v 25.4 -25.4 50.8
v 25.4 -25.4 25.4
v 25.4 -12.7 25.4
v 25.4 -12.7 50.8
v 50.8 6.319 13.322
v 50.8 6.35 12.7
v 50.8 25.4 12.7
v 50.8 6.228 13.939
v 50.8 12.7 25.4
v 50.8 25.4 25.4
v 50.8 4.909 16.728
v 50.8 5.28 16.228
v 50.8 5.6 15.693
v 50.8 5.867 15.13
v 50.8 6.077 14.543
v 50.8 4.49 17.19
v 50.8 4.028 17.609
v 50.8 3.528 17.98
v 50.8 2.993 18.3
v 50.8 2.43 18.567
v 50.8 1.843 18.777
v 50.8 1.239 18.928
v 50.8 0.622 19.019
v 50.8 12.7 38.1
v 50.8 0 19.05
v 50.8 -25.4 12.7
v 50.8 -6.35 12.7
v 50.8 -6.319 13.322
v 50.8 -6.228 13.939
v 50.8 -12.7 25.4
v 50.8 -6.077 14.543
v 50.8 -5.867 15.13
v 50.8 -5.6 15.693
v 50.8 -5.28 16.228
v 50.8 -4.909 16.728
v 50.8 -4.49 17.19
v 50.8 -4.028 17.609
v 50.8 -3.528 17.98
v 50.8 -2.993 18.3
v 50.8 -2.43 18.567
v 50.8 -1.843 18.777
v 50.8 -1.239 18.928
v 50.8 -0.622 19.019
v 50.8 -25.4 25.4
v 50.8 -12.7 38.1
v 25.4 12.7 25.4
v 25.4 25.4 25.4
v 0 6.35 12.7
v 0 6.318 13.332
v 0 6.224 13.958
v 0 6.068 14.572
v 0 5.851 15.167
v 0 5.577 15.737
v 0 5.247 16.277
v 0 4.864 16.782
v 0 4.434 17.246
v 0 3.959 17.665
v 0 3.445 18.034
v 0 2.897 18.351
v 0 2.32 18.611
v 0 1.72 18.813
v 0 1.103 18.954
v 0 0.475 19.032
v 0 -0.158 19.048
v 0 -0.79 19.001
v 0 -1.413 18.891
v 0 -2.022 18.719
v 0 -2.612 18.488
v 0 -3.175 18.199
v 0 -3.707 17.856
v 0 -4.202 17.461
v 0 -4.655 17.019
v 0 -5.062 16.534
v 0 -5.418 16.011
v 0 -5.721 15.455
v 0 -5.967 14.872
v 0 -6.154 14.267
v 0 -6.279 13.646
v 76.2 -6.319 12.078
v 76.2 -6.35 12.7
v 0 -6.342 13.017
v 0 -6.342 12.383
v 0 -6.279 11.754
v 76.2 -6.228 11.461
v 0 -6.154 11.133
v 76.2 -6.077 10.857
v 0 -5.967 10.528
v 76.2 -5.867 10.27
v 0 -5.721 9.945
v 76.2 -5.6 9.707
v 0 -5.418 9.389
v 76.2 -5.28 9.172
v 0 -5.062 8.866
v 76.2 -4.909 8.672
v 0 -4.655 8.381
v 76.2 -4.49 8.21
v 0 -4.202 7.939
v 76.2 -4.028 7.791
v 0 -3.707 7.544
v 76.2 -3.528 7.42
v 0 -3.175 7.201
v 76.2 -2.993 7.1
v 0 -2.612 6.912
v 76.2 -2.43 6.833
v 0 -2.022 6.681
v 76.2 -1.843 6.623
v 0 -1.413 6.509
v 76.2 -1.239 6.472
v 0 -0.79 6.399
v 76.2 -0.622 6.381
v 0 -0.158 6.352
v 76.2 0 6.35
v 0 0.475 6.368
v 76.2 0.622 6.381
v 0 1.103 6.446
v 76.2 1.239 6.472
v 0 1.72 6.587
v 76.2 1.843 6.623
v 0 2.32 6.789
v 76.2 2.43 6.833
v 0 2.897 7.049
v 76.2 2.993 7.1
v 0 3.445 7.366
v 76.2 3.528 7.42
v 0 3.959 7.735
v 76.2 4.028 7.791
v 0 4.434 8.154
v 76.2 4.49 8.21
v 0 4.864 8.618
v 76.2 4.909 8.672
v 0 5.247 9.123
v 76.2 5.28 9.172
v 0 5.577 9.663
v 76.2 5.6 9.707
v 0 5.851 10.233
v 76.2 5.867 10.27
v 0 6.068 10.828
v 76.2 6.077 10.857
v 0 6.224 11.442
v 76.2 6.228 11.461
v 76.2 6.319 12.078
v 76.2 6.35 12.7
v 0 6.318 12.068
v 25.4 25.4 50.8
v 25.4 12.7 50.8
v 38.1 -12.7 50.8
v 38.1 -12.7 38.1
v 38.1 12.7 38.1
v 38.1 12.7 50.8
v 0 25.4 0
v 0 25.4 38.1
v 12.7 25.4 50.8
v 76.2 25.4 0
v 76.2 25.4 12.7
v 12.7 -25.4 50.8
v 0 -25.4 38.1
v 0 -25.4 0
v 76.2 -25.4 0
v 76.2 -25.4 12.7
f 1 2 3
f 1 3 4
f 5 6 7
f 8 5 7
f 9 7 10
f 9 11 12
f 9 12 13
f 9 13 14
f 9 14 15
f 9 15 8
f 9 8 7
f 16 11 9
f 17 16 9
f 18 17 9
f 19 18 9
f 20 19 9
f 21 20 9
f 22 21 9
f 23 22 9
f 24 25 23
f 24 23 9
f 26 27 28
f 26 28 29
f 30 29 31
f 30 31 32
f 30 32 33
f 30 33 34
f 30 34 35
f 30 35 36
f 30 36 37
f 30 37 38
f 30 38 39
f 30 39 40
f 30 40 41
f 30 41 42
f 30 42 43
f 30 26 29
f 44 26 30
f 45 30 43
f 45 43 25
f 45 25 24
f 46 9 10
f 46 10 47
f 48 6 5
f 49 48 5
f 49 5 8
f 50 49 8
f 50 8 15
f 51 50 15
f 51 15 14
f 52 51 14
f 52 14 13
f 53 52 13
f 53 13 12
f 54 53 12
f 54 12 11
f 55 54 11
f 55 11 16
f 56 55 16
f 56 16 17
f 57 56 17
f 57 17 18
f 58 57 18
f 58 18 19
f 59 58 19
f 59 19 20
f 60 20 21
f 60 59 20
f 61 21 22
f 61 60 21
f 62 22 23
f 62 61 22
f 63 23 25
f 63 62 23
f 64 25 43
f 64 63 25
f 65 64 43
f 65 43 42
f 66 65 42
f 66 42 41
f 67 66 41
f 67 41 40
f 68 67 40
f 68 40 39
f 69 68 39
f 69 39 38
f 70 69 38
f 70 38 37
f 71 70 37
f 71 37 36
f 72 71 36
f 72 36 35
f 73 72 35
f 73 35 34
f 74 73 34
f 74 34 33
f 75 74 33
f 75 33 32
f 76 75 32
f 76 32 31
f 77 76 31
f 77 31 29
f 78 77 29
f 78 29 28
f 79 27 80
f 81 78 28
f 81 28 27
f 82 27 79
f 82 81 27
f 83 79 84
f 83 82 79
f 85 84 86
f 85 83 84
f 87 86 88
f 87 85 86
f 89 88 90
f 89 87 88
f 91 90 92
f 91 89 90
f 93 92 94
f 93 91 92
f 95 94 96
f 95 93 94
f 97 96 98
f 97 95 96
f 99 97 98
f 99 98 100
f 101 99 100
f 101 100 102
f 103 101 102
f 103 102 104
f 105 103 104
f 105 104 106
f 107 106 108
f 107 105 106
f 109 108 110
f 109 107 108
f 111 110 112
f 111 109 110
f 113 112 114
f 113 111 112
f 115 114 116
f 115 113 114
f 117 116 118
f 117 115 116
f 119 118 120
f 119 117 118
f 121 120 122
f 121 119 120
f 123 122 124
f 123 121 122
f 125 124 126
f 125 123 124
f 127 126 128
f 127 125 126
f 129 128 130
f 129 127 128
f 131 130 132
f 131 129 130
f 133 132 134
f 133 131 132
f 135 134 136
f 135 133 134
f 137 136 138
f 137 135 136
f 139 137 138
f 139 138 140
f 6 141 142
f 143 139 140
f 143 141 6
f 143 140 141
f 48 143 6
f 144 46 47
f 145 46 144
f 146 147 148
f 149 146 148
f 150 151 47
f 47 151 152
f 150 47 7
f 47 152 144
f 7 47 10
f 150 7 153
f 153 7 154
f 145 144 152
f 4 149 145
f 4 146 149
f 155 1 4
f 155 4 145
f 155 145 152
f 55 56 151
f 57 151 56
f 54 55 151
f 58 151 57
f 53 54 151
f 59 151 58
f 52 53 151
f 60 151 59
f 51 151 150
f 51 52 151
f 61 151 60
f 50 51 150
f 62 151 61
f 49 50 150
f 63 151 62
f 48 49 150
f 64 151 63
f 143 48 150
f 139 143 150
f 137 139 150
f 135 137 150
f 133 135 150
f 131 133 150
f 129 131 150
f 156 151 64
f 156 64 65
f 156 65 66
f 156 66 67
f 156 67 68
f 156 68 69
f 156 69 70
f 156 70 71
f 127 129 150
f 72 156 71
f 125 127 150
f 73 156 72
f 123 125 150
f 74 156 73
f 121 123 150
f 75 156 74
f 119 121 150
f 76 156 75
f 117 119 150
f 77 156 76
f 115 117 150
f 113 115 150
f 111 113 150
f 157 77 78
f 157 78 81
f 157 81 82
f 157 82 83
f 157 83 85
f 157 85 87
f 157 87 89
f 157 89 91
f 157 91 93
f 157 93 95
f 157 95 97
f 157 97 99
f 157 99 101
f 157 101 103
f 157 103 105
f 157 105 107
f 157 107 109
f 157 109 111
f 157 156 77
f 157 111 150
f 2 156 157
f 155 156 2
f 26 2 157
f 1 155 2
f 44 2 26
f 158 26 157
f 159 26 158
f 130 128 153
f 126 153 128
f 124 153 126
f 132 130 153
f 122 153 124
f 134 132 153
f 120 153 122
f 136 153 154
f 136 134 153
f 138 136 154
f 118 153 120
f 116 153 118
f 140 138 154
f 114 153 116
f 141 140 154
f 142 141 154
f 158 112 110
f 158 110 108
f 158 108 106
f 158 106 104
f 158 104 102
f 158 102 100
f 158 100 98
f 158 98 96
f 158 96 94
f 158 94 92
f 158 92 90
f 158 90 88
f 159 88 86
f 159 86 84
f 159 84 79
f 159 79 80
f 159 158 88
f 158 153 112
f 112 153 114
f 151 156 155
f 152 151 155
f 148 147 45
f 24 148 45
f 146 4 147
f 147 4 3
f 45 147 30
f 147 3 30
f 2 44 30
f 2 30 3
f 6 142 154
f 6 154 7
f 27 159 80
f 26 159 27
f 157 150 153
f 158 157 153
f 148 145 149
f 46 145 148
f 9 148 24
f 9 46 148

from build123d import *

# Parameters (mm, degrees)
F1_DEPTH  = 25.4
F2_W      = 12.7
F2_H      = 25.4
F3_DEPTH  = 50.8
F4_W      = 12.7
F4_H      = 25.4
F5_DEPTH  = 38.1
F6_DEPTH  = 25.401
F8_DEPTH  = 25.401
F9_R      = 6.35
F10_DEPTH = 76.201


with BuildPart() as f1:
    # F0 (on Front) → F1 (new body, symmetric)
    with BuildSketch(Plane.XZ):
        Polygon((0, 38.1), (0, 0), (76.2, 0), (76.2, 12.7), (50.8, 12.7), (50.8, 25.4), (25.4, 25.4), (25.4, 50.8), (12.7, 50.8), align=None)
        Polygon((0, 50.8), (0, 38.1), (12.7, 50.8), align=None)
    extrude(amount=F1_DEPTH, both=True)

    # F2 (on Top) → F3 (join)
    with BuildSketch(Plane.XY):
        with Locations((31.75, 0)):
            Rectangle(F2_W, F2_H)
    extrude(amount=F3_DEPTH)

    # F4 (on Top) → F5 (join)
    with BuildSketch(Plane.XY):
        with Locations((44.45, 0)):
            Rectangle(F4_W, F4_H)
    extrude(amount=F5_DEPTH)

    # F0 (on Front) → F6 (cut, through all)
    with BuildSketch(Plane.XZ):
        Polygon((0, 50.8), (0, 38.1), (12.7, 50.8), align=None)
    extrude(amount=F6_DEPTH, mode=Mode.SUBTRACT)

    # F7 (on Front) → F8 (cut, through all)
    with BuildSketch(Plane.XZ):
        Polygon((0, 38.1), (12.7, 50.8), (0, 50.8), align=None)
    extrude(amount=-F8_DEPTH, mode=Mode.SUBTRACT)

    # F9 (on Right) → F10 (cut, through all)
    with BuildSketch(Plane.YZ):
        with Locations((0, 12.7)):
            Circle(F9_R)
    extrude(amount=F10_DEPTH, mode=Mode.SUBTRACT)


solid = f1.part
